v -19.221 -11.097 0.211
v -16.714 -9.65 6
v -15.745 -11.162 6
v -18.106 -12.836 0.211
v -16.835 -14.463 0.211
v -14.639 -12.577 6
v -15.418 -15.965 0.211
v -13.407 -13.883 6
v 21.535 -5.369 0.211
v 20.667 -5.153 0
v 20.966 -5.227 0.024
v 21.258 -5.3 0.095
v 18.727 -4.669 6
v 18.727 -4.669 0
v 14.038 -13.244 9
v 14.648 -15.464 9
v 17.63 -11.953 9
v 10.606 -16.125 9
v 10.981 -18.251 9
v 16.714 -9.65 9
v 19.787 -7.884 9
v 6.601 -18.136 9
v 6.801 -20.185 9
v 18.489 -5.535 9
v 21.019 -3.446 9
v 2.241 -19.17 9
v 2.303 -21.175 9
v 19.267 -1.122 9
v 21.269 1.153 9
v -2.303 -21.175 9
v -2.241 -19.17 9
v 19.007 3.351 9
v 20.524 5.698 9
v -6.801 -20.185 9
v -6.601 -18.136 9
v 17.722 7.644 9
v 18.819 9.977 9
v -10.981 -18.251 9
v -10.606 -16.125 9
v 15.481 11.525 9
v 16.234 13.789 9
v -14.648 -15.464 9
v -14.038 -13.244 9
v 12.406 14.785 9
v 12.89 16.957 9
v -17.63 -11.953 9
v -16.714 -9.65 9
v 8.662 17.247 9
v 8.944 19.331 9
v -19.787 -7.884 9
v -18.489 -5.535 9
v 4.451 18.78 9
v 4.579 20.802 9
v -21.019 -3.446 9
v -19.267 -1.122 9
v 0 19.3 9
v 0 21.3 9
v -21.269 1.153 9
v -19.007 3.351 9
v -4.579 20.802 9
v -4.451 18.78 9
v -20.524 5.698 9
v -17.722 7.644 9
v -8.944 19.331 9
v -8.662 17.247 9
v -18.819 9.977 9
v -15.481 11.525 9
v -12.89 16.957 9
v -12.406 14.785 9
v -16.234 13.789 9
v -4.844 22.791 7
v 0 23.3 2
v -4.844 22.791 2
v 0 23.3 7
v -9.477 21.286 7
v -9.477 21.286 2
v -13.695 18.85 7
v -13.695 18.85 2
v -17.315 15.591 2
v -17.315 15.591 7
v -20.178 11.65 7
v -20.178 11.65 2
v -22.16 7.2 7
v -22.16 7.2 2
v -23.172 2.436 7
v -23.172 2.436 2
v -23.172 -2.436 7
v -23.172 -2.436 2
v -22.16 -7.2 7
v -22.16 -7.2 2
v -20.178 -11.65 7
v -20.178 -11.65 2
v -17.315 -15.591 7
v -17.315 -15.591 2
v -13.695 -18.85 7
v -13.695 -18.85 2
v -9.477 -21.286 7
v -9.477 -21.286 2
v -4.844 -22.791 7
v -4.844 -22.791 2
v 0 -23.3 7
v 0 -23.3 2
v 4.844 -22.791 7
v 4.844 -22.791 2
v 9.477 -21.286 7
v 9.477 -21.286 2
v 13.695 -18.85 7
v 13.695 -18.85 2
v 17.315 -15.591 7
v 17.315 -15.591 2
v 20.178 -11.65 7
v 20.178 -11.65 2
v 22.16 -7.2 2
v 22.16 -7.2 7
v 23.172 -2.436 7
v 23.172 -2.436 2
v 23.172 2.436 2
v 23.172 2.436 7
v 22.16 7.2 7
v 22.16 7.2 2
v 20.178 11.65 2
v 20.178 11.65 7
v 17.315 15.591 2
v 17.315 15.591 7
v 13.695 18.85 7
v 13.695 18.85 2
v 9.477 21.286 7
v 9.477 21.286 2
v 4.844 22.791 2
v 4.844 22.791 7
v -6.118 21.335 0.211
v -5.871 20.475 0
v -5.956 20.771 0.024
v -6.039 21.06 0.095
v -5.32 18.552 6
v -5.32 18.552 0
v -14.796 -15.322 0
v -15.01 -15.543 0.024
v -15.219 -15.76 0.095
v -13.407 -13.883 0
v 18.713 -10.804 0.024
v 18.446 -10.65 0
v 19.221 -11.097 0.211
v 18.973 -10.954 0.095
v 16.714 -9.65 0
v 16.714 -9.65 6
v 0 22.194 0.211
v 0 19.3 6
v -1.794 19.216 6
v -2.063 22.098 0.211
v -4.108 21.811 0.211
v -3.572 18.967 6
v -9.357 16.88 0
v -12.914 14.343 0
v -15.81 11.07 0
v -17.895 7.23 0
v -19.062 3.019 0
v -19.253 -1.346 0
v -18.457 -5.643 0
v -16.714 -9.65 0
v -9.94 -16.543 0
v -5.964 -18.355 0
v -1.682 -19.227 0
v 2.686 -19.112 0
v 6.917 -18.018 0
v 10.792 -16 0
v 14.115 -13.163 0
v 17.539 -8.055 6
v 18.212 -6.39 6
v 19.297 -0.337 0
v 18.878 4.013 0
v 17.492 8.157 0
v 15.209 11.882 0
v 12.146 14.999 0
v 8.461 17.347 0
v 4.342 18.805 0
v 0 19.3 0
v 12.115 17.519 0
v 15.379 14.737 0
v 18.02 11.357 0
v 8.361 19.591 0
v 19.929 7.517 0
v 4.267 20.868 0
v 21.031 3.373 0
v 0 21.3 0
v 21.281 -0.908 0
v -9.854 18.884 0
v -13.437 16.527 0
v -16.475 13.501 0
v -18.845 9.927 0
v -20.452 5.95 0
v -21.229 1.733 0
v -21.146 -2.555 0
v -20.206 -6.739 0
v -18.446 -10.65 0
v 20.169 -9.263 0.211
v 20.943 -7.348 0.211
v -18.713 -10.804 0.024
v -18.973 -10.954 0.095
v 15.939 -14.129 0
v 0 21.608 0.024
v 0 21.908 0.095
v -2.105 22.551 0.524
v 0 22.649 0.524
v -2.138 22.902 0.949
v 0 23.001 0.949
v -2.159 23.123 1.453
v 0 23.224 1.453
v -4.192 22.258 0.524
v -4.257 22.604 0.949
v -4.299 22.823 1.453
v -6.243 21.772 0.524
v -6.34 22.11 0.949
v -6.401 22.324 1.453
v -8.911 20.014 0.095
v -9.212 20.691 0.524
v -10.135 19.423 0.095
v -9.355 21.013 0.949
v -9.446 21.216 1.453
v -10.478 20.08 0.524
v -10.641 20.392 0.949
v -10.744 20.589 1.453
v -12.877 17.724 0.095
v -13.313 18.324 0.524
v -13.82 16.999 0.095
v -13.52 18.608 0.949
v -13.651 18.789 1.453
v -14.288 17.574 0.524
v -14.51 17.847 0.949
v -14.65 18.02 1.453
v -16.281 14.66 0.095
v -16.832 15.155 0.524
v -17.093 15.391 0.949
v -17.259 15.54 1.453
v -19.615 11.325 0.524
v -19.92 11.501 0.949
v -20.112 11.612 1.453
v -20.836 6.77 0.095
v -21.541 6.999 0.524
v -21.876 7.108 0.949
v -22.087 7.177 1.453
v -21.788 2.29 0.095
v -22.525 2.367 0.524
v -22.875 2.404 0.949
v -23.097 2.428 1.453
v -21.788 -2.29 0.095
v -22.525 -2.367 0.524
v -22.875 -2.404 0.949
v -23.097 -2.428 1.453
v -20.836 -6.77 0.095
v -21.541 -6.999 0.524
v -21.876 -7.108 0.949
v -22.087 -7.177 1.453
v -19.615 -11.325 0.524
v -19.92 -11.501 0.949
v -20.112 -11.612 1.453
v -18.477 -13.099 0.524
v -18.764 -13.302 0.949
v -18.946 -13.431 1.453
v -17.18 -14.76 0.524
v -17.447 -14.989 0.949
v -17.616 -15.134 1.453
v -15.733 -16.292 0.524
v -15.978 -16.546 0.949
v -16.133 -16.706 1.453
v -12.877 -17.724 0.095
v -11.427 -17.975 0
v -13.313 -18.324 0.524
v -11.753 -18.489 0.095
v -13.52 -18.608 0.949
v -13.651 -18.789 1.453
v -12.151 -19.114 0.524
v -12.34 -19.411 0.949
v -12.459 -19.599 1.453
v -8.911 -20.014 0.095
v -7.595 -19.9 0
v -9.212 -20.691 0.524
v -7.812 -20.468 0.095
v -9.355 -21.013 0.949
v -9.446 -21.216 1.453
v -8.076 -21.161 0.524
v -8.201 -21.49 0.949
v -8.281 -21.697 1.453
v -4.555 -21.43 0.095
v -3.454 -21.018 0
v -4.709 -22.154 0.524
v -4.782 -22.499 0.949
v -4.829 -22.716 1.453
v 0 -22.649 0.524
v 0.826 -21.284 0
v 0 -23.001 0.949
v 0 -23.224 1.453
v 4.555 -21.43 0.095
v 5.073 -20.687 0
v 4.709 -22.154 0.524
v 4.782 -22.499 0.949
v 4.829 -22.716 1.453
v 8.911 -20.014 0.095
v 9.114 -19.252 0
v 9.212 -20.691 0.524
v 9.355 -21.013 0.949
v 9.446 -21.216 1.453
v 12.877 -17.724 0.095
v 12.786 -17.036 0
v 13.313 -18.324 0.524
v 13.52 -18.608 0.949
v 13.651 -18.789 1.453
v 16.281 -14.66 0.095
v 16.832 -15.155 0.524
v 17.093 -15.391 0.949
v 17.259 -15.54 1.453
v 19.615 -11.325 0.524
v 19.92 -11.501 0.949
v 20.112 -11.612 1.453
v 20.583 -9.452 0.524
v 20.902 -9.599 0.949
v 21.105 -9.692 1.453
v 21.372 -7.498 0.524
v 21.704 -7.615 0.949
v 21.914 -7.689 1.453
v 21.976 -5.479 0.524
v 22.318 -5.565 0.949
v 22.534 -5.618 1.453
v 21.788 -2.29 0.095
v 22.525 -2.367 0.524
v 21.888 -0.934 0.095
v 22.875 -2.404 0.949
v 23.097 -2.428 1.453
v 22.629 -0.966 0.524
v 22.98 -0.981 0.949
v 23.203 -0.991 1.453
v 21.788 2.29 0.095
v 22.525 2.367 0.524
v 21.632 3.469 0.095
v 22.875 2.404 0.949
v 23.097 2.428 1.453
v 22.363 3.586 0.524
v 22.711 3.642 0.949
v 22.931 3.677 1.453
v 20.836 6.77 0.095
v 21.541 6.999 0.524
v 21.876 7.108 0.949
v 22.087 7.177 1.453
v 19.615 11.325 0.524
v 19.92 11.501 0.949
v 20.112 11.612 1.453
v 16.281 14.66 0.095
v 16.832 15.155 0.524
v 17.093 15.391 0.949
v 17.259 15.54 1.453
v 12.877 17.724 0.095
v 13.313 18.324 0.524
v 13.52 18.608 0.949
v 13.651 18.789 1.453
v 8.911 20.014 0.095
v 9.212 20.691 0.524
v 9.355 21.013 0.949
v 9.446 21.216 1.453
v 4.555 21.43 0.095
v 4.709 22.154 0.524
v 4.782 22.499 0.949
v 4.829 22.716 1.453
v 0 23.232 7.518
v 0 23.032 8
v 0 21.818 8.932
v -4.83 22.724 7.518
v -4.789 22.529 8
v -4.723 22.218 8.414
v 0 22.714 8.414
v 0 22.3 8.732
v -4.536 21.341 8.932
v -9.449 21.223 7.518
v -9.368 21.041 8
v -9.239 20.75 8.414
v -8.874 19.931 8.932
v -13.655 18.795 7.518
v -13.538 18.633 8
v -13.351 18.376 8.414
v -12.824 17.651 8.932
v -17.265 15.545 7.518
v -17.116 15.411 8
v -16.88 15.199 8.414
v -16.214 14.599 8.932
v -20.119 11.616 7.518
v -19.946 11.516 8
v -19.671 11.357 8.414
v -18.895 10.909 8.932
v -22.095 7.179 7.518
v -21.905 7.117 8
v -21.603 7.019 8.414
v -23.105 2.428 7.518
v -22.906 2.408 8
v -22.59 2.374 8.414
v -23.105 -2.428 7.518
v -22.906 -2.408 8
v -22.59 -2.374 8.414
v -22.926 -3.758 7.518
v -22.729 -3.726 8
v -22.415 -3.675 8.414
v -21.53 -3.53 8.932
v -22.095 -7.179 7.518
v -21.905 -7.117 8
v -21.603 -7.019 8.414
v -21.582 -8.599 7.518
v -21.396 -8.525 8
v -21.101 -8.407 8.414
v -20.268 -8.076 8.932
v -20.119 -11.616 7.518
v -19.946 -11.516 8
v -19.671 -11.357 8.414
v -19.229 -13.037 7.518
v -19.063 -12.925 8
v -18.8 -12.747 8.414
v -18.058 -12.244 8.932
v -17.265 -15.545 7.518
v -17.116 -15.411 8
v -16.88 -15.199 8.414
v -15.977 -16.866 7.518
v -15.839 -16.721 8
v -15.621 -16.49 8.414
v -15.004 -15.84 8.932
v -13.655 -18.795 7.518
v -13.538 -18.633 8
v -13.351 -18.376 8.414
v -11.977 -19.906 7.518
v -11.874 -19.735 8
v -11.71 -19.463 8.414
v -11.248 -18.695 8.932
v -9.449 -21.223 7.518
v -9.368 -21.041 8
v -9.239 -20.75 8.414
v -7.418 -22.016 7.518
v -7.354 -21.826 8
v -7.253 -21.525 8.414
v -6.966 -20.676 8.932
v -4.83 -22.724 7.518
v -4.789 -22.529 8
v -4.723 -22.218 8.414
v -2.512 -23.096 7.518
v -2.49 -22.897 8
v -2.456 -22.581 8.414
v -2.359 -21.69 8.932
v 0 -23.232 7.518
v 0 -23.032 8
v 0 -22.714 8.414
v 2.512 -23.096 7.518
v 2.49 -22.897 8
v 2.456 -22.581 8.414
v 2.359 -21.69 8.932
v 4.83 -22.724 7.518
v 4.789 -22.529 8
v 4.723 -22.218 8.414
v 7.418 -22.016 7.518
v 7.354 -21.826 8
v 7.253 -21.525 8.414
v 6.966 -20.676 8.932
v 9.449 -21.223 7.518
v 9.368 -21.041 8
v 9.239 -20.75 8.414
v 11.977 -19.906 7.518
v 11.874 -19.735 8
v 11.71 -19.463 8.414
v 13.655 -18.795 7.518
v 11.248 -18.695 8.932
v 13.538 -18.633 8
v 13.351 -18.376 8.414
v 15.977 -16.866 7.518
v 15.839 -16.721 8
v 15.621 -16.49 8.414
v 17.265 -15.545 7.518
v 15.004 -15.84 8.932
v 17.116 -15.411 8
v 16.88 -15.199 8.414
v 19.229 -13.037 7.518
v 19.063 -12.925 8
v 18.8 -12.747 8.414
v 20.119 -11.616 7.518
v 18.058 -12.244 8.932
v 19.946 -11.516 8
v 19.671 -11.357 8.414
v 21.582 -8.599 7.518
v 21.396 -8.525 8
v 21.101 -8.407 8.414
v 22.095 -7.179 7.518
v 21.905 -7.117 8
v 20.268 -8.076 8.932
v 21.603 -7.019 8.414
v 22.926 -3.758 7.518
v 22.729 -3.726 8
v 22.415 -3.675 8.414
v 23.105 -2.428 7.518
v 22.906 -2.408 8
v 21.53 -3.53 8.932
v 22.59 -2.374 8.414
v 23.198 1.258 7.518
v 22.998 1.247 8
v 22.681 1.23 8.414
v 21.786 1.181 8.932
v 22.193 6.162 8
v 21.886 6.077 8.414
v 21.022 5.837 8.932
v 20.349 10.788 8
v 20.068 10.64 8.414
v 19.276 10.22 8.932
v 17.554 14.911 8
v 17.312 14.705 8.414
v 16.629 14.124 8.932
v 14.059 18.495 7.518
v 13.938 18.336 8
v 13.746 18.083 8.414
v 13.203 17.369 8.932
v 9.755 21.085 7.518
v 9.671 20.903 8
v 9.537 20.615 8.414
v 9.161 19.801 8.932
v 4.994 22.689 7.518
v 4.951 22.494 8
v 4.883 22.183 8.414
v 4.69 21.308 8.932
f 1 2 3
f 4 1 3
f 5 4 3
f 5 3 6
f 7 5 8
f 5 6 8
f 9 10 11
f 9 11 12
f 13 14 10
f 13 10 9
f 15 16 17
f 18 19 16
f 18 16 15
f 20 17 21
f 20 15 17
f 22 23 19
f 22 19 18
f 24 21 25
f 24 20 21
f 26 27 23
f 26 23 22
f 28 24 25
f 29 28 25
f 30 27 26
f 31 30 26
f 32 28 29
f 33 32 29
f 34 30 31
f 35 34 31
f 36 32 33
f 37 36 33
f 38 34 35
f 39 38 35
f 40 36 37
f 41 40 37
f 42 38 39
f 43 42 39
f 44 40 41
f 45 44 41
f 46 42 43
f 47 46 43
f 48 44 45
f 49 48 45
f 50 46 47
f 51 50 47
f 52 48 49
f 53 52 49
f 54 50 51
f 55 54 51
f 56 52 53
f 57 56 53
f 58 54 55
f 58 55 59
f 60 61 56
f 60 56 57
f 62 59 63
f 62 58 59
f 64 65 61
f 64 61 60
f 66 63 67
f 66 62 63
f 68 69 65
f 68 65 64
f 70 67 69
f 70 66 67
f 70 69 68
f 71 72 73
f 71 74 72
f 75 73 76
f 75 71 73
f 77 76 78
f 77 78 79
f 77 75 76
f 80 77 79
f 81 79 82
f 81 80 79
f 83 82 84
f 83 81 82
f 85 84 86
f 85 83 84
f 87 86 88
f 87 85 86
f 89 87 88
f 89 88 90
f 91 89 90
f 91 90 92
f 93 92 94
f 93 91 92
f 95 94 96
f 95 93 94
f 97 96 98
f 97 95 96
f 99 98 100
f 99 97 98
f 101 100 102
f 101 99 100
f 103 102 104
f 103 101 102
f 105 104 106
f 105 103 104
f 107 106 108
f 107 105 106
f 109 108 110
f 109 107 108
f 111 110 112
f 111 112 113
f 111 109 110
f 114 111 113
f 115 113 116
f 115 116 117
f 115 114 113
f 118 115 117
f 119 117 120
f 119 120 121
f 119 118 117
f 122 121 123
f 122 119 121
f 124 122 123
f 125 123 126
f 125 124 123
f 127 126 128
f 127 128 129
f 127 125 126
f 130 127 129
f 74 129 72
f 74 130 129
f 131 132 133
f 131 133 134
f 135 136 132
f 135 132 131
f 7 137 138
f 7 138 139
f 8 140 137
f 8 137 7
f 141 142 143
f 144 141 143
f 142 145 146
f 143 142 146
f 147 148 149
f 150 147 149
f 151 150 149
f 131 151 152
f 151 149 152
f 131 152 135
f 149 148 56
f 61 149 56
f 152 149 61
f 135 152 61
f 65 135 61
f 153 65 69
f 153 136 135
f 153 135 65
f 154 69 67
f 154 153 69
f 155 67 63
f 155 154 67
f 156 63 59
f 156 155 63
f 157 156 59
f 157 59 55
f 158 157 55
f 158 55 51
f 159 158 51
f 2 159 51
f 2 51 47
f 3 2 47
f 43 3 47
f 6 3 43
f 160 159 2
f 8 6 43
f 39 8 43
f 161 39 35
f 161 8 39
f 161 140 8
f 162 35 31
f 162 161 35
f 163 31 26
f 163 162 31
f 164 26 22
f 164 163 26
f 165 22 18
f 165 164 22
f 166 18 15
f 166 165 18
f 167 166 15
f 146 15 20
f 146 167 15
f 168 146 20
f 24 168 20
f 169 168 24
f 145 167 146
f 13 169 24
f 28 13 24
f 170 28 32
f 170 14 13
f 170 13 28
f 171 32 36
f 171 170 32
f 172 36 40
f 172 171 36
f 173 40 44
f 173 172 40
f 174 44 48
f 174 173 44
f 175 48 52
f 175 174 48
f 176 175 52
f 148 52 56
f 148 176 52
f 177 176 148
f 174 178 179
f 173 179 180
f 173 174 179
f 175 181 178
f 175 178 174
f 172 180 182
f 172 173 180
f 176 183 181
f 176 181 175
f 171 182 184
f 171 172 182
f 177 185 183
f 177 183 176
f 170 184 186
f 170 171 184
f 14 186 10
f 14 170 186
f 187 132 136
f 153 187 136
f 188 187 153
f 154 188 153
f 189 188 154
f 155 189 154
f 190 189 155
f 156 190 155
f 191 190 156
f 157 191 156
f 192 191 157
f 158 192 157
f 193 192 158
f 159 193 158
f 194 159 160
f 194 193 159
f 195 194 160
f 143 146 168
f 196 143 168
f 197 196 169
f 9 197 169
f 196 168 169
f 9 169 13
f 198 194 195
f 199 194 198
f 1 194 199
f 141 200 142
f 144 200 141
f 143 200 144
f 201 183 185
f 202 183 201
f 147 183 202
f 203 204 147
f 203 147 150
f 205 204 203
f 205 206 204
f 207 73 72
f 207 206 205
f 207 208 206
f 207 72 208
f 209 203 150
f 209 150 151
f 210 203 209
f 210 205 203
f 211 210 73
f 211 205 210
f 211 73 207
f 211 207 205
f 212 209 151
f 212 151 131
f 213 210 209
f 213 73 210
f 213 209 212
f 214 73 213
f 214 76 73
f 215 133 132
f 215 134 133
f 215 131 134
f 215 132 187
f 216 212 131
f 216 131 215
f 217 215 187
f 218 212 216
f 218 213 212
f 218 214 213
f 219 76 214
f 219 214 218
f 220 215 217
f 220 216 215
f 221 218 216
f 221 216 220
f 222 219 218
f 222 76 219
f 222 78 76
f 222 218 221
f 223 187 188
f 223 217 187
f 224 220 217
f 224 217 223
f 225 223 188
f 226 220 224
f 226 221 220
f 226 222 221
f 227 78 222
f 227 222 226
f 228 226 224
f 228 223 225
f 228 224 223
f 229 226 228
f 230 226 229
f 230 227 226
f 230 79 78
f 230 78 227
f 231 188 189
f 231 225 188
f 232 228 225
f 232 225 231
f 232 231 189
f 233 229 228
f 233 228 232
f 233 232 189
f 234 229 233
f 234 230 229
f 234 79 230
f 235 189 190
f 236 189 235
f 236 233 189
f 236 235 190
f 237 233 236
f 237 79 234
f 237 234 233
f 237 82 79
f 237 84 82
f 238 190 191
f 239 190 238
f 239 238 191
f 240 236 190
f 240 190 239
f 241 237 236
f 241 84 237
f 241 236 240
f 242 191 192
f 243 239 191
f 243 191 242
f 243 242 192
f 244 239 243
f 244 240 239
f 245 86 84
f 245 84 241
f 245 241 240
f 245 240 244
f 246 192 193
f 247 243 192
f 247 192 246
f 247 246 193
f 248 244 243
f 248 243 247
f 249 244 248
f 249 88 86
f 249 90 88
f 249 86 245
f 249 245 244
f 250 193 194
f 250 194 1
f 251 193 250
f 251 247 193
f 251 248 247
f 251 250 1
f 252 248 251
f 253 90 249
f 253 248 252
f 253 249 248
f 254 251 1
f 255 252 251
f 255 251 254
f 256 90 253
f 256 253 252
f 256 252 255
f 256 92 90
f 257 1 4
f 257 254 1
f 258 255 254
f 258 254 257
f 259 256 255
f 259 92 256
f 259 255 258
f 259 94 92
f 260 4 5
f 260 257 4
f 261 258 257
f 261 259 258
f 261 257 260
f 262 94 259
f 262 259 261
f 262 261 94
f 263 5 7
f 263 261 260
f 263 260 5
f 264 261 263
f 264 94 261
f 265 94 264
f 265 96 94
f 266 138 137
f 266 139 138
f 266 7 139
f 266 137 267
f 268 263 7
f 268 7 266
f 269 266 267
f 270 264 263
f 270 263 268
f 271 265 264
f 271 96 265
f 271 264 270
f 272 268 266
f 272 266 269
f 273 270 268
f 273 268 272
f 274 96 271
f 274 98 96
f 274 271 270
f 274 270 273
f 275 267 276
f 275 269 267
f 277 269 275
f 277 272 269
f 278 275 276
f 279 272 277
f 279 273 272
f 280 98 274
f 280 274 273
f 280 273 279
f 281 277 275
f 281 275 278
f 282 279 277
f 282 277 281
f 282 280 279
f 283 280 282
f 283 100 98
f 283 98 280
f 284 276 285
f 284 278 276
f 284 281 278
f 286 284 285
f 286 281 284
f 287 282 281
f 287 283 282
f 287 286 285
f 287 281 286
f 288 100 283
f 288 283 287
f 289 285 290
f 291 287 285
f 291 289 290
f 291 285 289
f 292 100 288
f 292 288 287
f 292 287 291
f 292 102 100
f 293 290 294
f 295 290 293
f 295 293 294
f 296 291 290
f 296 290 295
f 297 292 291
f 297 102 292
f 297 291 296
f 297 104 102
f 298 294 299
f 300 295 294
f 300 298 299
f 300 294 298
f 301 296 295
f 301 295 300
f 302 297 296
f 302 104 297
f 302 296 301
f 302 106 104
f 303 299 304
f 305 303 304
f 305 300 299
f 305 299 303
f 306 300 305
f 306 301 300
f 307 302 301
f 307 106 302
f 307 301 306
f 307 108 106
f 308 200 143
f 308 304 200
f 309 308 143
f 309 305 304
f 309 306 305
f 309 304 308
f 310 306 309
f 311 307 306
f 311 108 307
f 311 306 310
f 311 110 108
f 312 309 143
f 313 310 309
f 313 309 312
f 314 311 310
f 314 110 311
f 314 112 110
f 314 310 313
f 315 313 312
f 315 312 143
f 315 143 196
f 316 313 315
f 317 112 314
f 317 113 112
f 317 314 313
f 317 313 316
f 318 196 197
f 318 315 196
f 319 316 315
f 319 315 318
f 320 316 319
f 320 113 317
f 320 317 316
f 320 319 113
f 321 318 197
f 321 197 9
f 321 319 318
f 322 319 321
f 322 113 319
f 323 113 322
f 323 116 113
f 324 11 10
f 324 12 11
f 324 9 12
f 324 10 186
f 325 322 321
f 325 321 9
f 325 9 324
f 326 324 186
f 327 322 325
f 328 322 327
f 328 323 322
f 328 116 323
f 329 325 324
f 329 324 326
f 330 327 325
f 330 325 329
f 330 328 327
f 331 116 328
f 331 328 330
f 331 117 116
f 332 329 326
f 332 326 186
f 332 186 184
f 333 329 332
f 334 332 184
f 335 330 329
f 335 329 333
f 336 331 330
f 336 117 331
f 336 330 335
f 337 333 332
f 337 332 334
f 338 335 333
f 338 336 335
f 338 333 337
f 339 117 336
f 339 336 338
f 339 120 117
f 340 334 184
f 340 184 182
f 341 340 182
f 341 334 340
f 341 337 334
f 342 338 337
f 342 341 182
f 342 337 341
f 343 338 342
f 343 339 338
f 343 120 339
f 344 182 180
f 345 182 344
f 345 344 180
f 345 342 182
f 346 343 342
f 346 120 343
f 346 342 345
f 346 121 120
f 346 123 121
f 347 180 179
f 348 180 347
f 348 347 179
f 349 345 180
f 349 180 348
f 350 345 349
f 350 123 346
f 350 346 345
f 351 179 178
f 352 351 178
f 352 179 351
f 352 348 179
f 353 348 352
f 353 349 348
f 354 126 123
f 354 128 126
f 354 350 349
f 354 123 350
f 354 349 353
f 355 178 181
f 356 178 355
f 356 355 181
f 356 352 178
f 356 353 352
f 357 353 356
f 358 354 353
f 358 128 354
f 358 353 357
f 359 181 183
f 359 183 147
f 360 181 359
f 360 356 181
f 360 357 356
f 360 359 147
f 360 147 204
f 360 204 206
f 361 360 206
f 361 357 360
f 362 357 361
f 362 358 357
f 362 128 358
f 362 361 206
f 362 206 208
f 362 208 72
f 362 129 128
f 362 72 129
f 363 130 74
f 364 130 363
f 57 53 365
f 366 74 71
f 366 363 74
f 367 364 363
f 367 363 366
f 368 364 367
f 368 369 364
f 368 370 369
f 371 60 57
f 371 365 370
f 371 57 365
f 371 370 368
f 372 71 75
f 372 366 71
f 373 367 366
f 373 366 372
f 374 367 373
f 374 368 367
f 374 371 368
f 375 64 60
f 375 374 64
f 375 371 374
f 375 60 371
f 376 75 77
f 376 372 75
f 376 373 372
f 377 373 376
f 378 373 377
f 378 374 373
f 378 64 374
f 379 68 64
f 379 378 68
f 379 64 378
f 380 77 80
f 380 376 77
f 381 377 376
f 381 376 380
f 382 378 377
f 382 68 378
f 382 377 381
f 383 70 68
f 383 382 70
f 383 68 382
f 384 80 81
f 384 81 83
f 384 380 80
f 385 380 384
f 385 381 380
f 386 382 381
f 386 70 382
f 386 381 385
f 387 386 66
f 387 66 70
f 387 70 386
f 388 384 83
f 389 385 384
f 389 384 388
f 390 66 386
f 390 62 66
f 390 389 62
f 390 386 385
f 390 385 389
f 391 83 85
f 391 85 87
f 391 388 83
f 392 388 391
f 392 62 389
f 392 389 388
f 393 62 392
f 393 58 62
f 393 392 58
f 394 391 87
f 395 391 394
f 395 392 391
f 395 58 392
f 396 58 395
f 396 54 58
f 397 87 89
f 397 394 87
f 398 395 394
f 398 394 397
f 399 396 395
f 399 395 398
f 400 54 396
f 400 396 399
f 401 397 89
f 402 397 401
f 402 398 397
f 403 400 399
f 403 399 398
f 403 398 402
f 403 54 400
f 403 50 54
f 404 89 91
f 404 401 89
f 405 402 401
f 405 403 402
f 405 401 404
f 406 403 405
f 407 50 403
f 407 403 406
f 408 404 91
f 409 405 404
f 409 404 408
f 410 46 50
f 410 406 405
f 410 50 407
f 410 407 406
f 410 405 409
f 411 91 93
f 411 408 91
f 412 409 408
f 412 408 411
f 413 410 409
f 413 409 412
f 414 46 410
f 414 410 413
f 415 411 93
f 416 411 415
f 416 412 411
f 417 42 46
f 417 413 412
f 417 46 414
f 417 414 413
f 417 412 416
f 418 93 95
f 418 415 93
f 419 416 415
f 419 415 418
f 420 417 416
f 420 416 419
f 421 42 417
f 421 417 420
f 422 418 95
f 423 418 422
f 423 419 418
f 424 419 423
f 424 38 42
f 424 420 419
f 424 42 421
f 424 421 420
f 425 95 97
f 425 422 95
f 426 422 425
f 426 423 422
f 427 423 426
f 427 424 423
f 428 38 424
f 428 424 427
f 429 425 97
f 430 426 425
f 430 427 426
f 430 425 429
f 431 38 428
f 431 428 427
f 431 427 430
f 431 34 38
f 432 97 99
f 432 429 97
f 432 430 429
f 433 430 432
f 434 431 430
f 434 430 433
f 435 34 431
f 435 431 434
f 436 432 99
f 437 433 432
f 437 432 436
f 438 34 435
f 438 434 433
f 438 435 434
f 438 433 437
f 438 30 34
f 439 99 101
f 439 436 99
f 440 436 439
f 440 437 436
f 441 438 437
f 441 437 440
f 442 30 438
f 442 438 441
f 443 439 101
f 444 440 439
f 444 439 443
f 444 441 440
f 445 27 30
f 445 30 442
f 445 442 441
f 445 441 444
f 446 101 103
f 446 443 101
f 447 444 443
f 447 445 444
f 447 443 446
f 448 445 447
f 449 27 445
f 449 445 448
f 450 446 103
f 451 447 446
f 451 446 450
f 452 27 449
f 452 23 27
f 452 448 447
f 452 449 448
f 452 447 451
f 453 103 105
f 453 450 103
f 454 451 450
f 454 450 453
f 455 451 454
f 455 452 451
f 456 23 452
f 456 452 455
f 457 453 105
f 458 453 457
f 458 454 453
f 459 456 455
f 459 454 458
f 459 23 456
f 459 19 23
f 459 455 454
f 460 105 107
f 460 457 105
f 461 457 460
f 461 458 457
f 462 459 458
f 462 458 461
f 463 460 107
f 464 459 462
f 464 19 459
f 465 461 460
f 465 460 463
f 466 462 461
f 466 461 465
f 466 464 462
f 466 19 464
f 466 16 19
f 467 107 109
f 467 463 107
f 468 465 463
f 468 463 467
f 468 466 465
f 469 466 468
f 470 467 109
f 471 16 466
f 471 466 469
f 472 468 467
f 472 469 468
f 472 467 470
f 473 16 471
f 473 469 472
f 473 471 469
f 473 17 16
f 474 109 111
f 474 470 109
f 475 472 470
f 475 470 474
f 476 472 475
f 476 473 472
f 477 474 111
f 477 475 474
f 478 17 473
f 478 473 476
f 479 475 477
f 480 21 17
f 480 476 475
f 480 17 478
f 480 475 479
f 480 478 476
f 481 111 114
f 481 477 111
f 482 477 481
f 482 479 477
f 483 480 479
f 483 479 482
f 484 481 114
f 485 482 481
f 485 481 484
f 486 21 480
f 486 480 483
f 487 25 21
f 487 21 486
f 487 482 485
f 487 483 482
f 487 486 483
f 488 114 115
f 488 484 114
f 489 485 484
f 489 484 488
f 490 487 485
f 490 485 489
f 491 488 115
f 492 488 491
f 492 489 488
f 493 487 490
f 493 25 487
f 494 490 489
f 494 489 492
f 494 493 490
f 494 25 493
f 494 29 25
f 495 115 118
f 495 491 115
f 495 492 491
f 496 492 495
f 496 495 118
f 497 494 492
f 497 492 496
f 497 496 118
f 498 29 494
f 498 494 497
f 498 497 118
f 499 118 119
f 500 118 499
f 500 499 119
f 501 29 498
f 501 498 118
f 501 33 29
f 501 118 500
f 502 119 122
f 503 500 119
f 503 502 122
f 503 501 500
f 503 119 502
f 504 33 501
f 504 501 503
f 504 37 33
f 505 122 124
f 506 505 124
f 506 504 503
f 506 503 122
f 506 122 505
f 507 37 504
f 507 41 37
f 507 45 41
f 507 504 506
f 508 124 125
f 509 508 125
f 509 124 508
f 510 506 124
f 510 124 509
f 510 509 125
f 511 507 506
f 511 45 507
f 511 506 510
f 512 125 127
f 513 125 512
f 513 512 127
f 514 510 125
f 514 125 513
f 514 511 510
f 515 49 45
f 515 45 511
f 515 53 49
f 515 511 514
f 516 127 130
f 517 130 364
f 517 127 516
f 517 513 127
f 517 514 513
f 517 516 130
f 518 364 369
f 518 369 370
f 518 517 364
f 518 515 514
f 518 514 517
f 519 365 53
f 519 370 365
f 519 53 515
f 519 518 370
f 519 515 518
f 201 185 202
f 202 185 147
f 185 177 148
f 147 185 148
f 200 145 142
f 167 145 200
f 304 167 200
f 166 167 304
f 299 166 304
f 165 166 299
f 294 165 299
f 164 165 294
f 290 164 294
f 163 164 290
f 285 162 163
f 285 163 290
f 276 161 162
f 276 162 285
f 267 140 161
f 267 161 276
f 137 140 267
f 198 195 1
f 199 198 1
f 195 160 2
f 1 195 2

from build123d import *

# Parameters (mm, degrees)
GROOVE_ANGLE    = 16
GROOVE001_ANGLE = 16
GROOVE002_ANGLE = 16


with BuildPart() as part:
    # Sketch027 → Revolution008 (revolve)
    with BuildSketch(Plane.YZ):
        with BuildLine():
            Line((19.3, 0), (21.3, 0))
            ThreePointArc((21.3, 0), (22.714214, 0.585786), (23.3, 2))
            Line((23.3, 2), (23.3, 7))
            ThreePointArc((23.3, 7), (22.714214, 8.414214), (21.3, 9))
            Line((21.3, 9), (19.3, 9))
            Line((19.3, 9), (19.3, 0))
        make_face()
    revolve(axis=Axis((0, 0, 0), (0, 0, 1)))

    # Sketch028 → Groove (revolve, cut)
    with BuildSketch(Plane.YZ):
        Polygon((19.3, 0), (22.3, 0), (19.3, 6), align=None)
    revolve(axis=Axis((0, 0, 0), (0, 0, 1)), revolution_arc=GROOVE_ANGLE, mode=Mode.SUBTRACT)

    # Sketch029 (on DatumPlane) → Groove001 (revolve, cut)
    with BuildSketch(Plane(origin=(0, 0, 0), x_dir=(-0.866025, -0.5, 0), z_dir=(-0.5, 0.866025, 0))):
        Polygon((19.3, 0), (22.3, 0), (19.3, 6), align=None)
    revolve(axis=Axis((0, 0, 0), (0, 0, 1)), revolution_arc=GROOVE001_ANGLE, mode=Mode.SUBTRACT)

    # Sketch047 (on DatumPlane) → Groove002 (revolve, cut)
    with BuildSketch(Plane(origin=(0, 0, 0), x_dir=(0.866025, -0.5, 0), z_dir=(-0.5, -0.866025, 0))):
        Polygon((19.3, 0), (22.3, 0), (19.3, 6), align=None)
    revolve(axis=Axis((0, 0, 0), (0, 0, 1)), revolution_arc=GROOVE002_ANGLE, mode=Mode.SUBTRACT)


solid = part.part
